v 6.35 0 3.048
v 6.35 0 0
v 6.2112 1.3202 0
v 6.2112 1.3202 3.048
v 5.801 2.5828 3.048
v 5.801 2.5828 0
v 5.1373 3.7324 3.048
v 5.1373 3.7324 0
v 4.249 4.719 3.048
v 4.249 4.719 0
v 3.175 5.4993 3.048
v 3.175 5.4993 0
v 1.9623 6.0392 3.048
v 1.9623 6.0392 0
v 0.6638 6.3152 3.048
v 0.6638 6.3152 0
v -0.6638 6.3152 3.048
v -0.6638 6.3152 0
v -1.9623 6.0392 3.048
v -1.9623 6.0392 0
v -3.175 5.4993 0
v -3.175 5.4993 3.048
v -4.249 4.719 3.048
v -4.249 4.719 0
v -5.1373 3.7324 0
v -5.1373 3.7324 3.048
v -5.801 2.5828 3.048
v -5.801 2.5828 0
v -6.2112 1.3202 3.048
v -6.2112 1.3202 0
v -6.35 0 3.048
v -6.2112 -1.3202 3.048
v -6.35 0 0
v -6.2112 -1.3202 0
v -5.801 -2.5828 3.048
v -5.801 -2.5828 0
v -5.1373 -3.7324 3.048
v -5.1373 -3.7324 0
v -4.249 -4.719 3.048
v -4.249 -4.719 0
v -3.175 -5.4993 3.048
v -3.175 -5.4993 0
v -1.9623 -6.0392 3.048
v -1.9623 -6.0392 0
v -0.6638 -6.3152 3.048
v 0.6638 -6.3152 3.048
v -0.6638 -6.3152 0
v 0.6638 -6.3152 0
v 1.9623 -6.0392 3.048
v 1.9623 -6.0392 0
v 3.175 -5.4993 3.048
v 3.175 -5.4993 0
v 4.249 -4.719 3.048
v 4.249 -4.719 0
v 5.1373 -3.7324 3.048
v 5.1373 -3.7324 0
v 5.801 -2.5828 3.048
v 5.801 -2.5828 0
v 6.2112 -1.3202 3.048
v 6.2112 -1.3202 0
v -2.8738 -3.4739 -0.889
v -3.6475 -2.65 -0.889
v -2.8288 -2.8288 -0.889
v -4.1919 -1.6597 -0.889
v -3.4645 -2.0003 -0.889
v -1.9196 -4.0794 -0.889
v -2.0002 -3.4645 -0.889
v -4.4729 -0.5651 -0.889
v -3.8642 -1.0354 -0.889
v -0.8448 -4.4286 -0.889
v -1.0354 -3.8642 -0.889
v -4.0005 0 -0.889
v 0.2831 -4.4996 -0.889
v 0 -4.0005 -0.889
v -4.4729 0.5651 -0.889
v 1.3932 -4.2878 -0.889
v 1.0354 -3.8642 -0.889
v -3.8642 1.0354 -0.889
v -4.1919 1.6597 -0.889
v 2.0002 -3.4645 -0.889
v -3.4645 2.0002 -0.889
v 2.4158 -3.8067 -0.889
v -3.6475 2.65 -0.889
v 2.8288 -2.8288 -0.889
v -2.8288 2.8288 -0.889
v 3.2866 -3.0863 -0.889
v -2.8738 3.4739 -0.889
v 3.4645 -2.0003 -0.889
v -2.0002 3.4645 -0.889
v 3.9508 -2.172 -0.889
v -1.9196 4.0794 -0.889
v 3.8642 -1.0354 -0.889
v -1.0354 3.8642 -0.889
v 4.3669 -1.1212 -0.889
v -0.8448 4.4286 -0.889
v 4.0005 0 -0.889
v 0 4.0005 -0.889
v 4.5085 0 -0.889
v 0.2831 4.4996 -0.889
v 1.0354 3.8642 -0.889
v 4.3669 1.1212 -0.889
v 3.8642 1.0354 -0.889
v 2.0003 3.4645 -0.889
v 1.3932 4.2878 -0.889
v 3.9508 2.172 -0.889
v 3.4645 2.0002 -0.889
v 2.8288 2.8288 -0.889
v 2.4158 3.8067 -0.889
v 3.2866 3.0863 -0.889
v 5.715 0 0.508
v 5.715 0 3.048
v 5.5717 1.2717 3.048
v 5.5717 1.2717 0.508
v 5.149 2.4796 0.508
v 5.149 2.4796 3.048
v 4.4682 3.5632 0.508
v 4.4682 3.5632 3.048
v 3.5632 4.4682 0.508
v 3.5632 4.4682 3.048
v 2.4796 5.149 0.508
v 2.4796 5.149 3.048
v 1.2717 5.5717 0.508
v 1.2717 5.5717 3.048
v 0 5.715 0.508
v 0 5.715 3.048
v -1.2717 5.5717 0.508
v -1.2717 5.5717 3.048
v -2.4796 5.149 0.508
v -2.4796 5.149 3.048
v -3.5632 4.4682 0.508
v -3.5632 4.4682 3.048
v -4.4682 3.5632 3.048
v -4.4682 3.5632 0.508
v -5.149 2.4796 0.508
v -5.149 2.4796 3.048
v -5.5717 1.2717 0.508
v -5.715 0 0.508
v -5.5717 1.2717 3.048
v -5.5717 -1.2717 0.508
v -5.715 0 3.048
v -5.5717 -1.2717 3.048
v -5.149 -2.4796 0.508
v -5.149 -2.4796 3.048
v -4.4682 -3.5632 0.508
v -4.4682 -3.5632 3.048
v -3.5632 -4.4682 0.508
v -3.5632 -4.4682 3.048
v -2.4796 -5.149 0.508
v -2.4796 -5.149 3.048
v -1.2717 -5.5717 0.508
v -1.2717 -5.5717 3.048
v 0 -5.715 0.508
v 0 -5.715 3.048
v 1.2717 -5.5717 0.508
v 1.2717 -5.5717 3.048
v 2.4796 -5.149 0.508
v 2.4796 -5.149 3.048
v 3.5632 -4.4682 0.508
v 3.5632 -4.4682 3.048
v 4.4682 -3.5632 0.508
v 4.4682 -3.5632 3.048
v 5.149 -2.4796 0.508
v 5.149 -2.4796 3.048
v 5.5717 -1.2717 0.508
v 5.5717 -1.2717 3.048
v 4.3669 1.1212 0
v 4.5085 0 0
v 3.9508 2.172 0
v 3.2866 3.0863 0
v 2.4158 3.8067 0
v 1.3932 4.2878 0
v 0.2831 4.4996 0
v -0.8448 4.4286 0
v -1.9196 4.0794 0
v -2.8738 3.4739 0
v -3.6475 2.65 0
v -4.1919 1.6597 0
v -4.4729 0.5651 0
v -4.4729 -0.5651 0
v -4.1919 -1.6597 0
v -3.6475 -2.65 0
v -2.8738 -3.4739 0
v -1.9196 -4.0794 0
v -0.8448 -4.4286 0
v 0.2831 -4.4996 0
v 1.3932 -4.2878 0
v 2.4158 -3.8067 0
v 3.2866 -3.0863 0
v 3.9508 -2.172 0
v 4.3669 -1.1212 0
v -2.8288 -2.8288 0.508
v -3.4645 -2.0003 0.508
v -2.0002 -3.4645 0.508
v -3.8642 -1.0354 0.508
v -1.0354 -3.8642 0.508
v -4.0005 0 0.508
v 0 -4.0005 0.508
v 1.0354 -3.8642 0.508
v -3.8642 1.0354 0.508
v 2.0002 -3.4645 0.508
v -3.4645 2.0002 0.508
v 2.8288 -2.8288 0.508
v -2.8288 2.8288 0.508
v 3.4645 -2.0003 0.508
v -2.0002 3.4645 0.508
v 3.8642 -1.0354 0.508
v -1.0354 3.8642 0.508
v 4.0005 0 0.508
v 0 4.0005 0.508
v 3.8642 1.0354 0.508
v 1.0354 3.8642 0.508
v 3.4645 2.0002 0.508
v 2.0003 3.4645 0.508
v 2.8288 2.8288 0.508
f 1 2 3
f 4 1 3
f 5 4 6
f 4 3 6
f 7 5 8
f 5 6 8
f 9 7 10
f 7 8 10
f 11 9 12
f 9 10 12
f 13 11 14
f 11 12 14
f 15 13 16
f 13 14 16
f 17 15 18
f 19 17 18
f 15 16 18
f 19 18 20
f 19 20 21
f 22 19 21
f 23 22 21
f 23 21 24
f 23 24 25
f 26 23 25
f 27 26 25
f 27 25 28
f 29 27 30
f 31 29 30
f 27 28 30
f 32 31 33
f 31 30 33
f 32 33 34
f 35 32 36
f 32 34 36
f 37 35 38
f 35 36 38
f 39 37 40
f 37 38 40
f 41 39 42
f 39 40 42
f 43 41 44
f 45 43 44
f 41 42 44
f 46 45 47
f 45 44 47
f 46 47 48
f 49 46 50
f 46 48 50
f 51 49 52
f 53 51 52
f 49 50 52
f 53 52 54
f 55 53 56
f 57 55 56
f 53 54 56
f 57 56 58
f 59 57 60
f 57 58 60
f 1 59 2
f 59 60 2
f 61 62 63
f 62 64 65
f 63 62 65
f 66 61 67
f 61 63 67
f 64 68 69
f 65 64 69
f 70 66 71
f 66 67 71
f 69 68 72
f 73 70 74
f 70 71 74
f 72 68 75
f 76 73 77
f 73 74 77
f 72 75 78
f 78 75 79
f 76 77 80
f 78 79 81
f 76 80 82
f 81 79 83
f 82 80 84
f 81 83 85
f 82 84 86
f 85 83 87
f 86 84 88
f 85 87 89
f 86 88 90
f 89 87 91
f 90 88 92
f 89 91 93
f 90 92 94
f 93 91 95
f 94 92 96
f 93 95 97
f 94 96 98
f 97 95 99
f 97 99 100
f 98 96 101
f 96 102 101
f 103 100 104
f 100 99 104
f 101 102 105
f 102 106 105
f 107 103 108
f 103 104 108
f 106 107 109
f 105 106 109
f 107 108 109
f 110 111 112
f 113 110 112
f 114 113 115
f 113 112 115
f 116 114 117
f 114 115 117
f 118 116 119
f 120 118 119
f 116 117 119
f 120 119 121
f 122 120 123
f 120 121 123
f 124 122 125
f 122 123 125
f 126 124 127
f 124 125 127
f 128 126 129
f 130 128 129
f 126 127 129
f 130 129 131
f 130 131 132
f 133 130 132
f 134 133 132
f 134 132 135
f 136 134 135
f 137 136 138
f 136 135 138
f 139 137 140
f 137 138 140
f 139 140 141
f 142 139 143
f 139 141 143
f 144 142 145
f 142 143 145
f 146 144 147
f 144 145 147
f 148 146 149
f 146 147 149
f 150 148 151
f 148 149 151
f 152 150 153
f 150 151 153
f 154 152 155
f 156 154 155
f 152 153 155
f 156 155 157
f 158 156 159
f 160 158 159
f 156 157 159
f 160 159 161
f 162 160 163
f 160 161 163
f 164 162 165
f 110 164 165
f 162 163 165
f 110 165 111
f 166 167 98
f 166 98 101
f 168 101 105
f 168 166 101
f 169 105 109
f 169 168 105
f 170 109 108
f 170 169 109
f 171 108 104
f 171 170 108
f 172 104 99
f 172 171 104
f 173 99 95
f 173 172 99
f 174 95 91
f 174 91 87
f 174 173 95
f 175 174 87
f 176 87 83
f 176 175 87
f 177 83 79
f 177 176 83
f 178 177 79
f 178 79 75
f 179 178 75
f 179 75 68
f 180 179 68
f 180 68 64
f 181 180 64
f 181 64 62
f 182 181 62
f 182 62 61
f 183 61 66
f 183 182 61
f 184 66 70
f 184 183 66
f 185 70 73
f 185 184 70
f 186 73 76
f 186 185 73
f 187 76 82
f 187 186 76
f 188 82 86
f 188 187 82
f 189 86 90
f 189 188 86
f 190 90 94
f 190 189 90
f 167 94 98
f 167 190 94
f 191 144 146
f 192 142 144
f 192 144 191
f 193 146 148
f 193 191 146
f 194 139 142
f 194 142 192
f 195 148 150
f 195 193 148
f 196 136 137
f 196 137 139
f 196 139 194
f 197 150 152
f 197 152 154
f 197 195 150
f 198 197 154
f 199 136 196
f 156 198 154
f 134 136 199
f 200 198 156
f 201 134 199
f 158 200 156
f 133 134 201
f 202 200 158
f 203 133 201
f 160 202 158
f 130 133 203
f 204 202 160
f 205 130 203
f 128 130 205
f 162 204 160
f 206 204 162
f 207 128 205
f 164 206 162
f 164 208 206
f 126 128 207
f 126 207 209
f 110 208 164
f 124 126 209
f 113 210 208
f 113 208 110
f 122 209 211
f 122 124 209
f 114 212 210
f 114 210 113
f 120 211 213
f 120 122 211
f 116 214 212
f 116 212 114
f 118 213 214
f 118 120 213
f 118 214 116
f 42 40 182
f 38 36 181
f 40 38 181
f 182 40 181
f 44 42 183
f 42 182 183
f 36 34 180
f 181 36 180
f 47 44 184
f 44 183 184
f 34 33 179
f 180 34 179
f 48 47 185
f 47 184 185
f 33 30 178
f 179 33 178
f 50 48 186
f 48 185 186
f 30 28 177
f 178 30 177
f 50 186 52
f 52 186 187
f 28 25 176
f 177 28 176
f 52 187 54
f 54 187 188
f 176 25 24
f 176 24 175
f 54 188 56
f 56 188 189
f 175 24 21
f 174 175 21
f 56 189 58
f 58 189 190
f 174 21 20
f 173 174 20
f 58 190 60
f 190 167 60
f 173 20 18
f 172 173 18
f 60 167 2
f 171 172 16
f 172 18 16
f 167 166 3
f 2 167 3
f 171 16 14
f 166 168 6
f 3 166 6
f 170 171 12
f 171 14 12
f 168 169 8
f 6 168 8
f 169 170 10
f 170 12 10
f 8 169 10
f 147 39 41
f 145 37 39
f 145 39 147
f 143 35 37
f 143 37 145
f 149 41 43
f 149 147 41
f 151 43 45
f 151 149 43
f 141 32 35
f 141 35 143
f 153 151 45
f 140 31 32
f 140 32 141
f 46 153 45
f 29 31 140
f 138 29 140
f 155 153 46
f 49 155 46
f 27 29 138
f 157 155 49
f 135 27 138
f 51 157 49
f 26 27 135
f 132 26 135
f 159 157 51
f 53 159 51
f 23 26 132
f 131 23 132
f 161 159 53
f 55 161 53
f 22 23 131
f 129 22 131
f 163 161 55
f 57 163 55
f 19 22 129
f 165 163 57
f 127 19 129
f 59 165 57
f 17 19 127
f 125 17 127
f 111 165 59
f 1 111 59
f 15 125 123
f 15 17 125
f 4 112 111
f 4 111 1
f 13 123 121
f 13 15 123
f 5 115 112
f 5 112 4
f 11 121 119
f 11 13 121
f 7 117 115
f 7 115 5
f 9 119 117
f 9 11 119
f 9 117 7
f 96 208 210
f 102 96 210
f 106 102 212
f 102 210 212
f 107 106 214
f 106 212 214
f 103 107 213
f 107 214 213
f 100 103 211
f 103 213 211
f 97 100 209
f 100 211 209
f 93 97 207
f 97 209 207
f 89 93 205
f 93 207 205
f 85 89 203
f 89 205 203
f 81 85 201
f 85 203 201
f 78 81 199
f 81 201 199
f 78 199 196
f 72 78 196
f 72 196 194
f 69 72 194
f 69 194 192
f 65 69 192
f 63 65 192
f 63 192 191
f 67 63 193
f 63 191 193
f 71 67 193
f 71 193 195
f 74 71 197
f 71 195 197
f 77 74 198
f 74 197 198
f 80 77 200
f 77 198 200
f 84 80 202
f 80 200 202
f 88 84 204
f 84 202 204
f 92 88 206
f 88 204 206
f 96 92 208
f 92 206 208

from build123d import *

# Parameters (mm, degrees)
F0_R     = 4.5085
F1_DEPTH = 0.889
F2_R     = 6.35
F4_DEPTH = 3.048
F3_R     = 4.0005
F6_DEPTH = 10.668
F5_R     = 5.715
F7_DEPTH = 2.54


with BuildPart() as f1:
    # F0 (on Top) → F1 (new body)
    with BuildSketch(Plane.XY):
        Circle(F0_R)
    extrude(amount=-F1_DEPTH)

    # F2 (on face) → F4 (join)
    with BuildSketch(Plane.XY):
        Circle(F2_R)
    extrude(amount=F4_DEPTH)

    # F3 (on face) → F6 (cut, symmetric)
    with BuildSketch(Plane.XY):
        Circle(F3_R)
    extrude(amount=F6_DEPTH, both=True, mode=Mode.SUBTRACT)

    # F5 (on face) → F7 (cut)
    with BuildSketch(Plane.XY.offset(3.048)):
        Circle(F5_R)
    extrude(amount=-F7_DEPTH, mode=Mode.SUBTRACT)


solid = f1.part
